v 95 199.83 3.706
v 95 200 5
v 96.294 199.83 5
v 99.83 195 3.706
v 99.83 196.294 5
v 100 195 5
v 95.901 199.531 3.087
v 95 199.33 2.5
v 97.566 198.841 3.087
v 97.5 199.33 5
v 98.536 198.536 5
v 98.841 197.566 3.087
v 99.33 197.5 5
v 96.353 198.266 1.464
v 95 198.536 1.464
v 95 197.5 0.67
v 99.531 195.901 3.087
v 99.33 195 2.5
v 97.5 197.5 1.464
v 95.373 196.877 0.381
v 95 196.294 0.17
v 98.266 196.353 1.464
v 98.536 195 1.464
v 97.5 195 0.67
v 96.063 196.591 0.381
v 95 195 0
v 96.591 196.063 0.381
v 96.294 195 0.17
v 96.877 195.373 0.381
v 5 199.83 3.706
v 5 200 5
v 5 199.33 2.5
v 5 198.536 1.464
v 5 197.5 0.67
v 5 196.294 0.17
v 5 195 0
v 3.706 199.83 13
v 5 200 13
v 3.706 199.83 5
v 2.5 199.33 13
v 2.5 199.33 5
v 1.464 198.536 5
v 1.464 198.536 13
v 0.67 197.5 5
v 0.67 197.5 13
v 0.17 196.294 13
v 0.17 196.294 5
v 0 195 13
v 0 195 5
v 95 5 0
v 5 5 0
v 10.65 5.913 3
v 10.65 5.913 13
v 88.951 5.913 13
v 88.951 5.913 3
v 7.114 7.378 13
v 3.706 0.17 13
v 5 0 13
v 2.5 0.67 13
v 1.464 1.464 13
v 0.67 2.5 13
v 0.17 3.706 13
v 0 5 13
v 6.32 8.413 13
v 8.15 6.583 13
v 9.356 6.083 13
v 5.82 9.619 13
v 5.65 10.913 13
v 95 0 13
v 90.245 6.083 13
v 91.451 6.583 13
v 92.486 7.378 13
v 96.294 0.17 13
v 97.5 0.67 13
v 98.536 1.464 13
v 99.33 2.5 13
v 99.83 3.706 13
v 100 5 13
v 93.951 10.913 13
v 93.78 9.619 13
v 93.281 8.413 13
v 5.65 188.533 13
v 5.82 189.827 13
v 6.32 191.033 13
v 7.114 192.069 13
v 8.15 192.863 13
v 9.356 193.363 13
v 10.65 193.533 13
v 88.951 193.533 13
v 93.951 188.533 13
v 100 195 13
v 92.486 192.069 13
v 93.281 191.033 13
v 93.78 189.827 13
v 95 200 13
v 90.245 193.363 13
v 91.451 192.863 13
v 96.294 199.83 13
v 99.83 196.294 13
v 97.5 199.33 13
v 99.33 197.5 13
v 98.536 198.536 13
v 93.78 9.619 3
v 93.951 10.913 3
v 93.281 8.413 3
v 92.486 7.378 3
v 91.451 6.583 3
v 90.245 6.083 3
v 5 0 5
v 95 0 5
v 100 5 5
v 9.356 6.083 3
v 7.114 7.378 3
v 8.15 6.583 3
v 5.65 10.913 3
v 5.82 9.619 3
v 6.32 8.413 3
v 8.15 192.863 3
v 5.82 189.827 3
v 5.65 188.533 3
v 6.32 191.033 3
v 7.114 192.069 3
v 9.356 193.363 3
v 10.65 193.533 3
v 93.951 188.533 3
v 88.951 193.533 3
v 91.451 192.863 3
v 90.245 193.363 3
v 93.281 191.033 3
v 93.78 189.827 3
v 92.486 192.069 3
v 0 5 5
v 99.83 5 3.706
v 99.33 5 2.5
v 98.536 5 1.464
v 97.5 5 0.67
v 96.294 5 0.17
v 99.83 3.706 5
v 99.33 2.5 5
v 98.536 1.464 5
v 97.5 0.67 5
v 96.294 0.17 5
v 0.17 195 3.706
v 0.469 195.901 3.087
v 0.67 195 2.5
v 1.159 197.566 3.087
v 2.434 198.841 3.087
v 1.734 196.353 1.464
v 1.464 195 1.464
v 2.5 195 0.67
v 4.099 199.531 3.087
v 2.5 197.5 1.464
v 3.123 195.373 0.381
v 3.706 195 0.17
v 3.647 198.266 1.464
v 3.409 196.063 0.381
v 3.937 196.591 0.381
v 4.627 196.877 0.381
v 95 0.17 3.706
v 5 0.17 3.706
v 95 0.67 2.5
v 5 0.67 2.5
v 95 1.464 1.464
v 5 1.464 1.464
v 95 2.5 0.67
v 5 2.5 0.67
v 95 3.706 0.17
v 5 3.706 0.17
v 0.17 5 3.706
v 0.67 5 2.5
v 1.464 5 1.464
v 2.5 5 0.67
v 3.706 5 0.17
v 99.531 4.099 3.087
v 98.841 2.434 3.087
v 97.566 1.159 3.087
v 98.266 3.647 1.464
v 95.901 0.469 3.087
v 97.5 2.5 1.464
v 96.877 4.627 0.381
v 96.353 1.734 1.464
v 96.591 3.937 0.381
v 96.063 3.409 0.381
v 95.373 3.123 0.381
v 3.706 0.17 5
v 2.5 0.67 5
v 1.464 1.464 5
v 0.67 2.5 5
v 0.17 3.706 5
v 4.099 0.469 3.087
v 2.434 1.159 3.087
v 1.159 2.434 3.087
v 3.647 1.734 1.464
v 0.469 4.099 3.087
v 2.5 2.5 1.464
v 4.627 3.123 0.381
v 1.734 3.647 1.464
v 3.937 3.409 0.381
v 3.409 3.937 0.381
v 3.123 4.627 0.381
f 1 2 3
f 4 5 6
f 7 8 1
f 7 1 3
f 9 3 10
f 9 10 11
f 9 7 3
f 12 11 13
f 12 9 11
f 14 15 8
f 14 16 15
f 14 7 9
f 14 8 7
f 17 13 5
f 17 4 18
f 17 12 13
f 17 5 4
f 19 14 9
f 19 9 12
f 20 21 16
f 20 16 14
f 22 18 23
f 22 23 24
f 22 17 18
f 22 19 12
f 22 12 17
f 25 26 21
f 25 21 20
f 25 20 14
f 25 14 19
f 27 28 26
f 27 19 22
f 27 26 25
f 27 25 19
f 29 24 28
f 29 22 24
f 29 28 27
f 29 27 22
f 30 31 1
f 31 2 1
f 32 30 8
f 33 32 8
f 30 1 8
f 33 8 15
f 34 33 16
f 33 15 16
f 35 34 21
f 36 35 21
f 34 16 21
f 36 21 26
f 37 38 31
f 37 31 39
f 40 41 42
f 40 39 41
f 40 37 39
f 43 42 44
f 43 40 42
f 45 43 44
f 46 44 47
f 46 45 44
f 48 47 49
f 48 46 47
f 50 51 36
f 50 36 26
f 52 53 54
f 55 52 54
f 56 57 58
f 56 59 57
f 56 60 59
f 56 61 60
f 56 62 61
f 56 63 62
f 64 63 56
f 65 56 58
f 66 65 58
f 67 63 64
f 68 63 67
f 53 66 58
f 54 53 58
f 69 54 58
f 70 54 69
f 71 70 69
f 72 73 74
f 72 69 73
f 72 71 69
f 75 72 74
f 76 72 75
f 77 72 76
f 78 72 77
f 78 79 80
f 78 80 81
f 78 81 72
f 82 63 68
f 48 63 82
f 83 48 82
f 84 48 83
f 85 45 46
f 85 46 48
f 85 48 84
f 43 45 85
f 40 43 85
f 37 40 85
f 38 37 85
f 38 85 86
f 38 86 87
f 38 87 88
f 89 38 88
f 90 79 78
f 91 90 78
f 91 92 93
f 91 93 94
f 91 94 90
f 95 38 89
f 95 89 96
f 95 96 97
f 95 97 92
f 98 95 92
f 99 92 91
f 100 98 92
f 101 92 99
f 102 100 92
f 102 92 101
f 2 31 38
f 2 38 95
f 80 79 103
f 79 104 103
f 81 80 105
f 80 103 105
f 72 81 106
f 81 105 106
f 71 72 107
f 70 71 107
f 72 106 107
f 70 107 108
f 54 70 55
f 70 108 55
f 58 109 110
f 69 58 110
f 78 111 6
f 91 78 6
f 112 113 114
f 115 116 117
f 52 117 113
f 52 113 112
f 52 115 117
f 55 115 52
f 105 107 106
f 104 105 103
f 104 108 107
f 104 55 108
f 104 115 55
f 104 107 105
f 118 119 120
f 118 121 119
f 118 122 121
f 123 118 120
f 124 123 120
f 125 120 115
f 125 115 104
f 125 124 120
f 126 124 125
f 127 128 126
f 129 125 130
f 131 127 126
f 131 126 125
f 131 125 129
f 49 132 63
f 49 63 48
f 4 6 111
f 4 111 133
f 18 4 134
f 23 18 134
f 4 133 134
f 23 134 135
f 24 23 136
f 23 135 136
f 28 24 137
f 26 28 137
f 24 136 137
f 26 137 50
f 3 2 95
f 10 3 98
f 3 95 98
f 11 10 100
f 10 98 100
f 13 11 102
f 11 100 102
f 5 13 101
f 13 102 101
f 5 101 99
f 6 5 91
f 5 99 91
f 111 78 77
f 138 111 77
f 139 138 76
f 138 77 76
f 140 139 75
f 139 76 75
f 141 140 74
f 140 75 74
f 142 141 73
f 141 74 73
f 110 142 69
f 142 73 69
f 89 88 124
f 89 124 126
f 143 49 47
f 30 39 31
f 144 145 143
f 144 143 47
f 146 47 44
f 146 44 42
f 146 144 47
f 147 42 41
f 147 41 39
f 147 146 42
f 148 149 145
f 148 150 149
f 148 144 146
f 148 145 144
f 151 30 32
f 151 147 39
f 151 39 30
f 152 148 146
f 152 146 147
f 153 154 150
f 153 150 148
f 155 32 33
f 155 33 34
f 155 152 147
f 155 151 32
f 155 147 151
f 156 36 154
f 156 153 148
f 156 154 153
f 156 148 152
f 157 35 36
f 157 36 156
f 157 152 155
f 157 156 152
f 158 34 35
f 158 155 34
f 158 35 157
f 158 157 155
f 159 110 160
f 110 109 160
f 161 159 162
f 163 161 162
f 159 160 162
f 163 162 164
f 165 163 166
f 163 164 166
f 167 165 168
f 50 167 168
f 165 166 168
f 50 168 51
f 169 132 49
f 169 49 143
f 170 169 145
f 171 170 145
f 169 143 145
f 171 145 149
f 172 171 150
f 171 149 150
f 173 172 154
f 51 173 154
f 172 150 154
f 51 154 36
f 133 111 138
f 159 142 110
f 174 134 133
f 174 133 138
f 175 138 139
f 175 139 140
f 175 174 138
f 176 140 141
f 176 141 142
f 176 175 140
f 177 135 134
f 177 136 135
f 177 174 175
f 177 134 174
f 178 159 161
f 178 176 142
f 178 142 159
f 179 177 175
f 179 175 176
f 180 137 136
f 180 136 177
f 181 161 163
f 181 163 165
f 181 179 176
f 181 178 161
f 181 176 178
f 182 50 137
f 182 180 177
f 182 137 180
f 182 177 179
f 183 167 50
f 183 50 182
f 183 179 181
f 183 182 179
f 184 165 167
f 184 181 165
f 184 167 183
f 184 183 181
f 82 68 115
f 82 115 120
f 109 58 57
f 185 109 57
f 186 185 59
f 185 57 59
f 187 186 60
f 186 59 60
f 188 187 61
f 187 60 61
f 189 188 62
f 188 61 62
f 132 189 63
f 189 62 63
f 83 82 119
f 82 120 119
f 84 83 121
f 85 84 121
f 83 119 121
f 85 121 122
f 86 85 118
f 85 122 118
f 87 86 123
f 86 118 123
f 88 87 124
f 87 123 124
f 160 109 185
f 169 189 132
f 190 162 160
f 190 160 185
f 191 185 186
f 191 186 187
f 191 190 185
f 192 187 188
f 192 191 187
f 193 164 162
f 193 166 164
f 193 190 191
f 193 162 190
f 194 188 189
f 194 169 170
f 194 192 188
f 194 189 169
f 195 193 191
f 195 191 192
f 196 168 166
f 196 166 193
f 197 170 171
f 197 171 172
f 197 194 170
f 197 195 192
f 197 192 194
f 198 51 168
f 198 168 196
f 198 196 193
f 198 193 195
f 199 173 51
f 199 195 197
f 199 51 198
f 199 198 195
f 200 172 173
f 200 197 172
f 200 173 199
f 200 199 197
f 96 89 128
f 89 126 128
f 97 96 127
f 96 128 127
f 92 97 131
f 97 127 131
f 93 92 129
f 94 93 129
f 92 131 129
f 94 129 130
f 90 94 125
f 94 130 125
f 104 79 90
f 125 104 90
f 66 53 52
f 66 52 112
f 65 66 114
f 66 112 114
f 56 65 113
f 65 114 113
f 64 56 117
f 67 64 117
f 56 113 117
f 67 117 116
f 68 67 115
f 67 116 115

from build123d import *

# Parameters (mm, degrees)
F0_W     = 100
F0_H     = 200
F1_DEPTH = 13
F3_W     = 88.300774
F3_H     = 187.619995
F4_DEPTH = 10
F5_R     = 5
F6_R     = 5
F7_R     = 5
F8_R     = 5
F9_R     = 5
F10_R    = 5
F11_R    = 5
F12_R    = 5
F13_R    = 5


with BuildPart() as f1:
    # F0 (on Top) → F1 (new body)
    with BuildSketch(Plane.XY):
        with Locations((50, 100)):
            Rectangle(F0_W, F0_H)
    extrude(amount=F1_DEPTH)

    # F3 (on face) → F4 (cut)
    with BuildSketch(Plane.XY.offset(13)):
        with Locations((49.800339, 99.72308)):
            Rectangle(F3_W, F3_H)
    extrude(amount=-F4_DEPTH, mode=Mode.SUBTRACT)

    # F5
    f5_edges = [f1.edges().sort_by_distance(p)[0] for p in [
        (100, 200, 6.5),
    ]]
    fillet(f5_edges, radius=F5_R)

    # F6
    f6_edges = [f1.edges().sort_by_distance(p)[0] for p in [
        (0, 200, 6.5),
    ]]
    fillet(f6_edges, radius=F6_R)

    # F7
    f7_edges = [f1.edges().sort_by_distance(p)[0] for p in [
        (100, 0, 6.5),
    ]]
    fillet(f7_edges, radius=F7_R)

    # F8
    f8_edges = [f1.edges().sort_by_distance(p)[0] for p in [
        (0, 0, 6.5),
    ]]
    fillet(f8_edges, radius=F8_R)

    # F9
    f9_edges = [f1.edges().sort_by_distance(p)[0] for p in [
        (5.649952, 5.913083, 8),
    ]]
    fillet(f9_edges, radius=F9_R)

    # F10
    f10_edges = [f1.edges().sort_by_distance(p)[0] for p in [
        (5.649952, 193.533078, 8),
    ]]
    fillet(f10_edges, radius=F10_R)

    # F11
    f11_edges = [f1.edges().sort_by_distance(p)[0] for p in [
        (93.950726, 193.533078, 8),
    ]]
    fillet(f11_edges, radius=F11_R)

    # F12
    f12_edges = [f1.edges().sort_by_distance(p)[0] for p in [
        (93.950726, 5.913083, 8),
    ]]
    fillet(f12_edges, radius=F12_R)

    # F13
    f13_edges = [f1.edges().sort_by_distance(p)[0] for p in [
        (0, 100, 0),
    ]]
    fillet(f13_edges, radius=F13_R)


solid = f1.part
